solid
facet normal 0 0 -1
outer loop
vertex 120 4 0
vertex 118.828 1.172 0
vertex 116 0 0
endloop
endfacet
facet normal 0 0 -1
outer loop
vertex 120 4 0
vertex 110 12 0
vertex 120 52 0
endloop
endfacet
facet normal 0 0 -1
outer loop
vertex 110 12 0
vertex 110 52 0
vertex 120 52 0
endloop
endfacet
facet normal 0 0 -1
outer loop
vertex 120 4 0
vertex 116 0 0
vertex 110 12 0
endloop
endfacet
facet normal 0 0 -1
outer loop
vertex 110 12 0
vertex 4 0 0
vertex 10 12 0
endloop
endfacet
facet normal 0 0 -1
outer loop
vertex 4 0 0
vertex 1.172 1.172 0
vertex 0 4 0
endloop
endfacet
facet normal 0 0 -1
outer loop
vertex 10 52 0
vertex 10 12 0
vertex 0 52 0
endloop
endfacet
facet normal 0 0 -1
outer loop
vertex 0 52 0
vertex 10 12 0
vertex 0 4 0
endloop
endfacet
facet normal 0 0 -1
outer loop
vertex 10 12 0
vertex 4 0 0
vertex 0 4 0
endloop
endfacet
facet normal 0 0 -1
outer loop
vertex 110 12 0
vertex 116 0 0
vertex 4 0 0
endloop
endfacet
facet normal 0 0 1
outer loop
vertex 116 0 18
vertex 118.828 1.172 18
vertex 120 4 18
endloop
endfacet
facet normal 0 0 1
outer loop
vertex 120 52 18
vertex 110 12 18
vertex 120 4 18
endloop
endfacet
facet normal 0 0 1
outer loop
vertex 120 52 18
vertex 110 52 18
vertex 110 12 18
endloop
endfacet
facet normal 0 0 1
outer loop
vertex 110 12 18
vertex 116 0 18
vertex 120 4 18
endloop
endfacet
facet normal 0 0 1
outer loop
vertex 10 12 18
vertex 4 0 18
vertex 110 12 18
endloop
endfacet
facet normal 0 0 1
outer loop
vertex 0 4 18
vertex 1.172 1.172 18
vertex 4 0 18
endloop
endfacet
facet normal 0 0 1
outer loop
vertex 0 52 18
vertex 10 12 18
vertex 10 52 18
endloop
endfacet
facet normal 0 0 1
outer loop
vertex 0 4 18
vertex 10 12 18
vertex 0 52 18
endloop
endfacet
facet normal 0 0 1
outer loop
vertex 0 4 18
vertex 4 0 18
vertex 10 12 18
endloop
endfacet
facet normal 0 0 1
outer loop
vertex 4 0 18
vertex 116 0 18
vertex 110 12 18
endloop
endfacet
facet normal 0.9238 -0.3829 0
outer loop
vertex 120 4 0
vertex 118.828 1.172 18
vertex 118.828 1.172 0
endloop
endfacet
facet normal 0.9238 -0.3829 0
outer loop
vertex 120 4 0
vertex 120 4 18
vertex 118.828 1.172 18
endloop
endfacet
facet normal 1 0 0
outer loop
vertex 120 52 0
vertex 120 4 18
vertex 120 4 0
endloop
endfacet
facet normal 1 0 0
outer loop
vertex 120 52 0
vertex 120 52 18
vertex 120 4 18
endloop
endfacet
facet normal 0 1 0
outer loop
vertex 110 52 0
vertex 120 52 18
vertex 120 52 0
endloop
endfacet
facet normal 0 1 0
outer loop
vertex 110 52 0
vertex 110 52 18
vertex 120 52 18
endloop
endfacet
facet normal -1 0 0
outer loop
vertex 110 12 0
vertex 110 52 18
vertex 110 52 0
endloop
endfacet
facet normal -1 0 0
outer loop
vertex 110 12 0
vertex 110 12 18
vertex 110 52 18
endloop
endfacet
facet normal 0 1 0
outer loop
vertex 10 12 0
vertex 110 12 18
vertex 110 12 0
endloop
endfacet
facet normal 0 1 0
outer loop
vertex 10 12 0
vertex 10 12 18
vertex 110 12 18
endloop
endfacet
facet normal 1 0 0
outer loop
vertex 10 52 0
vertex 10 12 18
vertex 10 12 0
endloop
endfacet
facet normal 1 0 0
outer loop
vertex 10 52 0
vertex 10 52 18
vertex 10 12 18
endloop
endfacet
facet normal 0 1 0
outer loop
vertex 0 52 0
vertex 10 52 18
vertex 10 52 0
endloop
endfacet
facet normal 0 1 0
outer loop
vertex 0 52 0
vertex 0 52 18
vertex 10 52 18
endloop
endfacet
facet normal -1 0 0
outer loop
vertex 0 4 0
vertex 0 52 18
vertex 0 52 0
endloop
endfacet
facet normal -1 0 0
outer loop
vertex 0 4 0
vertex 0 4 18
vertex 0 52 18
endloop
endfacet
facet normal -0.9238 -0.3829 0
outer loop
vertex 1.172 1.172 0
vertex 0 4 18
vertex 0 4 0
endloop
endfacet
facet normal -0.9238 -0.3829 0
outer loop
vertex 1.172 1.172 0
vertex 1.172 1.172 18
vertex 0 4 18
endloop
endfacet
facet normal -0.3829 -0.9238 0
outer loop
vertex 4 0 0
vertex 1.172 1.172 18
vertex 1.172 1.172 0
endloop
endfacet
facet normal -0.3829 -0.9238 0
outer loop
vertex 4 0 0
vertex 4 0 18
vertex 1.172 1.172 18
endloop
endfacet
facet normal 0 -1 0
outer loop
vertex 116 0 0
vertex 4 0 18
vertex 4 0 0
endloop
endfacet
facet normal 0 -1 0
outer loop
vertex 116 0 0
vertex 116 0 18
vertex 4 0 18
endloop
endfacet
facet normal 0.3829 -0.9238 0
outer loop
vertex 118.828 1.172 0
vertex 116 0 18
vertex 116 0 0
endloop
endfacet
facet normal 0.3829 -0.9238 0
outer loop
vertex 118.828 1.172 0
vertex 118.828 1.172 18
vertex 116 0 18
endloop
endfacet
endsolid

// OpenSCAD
$fn = 32;

// ----------------------------------------------------------------------
// Heat sink frame: 120 x 52 mm frame, 10 mm walls
// ----------------------------------------------------------------------

// --- parameters (mm) ---
profile_height = 18;      // extrusion height
profile_points = 12;      // points of the closed outline

profile = [[0, 4], [1.172, 1.172], [4, 0], [116, 0], [118.828, 1.172], [120, 4], [120, 52], [110, 52], [110, 12], [10, 12], [10, 52], [0, 52]];  // single closed polygon, 12 points, counter clockwise

// --- the one profile operation ---
linear_extrude(height = profile_height) polygon(points = profile);
